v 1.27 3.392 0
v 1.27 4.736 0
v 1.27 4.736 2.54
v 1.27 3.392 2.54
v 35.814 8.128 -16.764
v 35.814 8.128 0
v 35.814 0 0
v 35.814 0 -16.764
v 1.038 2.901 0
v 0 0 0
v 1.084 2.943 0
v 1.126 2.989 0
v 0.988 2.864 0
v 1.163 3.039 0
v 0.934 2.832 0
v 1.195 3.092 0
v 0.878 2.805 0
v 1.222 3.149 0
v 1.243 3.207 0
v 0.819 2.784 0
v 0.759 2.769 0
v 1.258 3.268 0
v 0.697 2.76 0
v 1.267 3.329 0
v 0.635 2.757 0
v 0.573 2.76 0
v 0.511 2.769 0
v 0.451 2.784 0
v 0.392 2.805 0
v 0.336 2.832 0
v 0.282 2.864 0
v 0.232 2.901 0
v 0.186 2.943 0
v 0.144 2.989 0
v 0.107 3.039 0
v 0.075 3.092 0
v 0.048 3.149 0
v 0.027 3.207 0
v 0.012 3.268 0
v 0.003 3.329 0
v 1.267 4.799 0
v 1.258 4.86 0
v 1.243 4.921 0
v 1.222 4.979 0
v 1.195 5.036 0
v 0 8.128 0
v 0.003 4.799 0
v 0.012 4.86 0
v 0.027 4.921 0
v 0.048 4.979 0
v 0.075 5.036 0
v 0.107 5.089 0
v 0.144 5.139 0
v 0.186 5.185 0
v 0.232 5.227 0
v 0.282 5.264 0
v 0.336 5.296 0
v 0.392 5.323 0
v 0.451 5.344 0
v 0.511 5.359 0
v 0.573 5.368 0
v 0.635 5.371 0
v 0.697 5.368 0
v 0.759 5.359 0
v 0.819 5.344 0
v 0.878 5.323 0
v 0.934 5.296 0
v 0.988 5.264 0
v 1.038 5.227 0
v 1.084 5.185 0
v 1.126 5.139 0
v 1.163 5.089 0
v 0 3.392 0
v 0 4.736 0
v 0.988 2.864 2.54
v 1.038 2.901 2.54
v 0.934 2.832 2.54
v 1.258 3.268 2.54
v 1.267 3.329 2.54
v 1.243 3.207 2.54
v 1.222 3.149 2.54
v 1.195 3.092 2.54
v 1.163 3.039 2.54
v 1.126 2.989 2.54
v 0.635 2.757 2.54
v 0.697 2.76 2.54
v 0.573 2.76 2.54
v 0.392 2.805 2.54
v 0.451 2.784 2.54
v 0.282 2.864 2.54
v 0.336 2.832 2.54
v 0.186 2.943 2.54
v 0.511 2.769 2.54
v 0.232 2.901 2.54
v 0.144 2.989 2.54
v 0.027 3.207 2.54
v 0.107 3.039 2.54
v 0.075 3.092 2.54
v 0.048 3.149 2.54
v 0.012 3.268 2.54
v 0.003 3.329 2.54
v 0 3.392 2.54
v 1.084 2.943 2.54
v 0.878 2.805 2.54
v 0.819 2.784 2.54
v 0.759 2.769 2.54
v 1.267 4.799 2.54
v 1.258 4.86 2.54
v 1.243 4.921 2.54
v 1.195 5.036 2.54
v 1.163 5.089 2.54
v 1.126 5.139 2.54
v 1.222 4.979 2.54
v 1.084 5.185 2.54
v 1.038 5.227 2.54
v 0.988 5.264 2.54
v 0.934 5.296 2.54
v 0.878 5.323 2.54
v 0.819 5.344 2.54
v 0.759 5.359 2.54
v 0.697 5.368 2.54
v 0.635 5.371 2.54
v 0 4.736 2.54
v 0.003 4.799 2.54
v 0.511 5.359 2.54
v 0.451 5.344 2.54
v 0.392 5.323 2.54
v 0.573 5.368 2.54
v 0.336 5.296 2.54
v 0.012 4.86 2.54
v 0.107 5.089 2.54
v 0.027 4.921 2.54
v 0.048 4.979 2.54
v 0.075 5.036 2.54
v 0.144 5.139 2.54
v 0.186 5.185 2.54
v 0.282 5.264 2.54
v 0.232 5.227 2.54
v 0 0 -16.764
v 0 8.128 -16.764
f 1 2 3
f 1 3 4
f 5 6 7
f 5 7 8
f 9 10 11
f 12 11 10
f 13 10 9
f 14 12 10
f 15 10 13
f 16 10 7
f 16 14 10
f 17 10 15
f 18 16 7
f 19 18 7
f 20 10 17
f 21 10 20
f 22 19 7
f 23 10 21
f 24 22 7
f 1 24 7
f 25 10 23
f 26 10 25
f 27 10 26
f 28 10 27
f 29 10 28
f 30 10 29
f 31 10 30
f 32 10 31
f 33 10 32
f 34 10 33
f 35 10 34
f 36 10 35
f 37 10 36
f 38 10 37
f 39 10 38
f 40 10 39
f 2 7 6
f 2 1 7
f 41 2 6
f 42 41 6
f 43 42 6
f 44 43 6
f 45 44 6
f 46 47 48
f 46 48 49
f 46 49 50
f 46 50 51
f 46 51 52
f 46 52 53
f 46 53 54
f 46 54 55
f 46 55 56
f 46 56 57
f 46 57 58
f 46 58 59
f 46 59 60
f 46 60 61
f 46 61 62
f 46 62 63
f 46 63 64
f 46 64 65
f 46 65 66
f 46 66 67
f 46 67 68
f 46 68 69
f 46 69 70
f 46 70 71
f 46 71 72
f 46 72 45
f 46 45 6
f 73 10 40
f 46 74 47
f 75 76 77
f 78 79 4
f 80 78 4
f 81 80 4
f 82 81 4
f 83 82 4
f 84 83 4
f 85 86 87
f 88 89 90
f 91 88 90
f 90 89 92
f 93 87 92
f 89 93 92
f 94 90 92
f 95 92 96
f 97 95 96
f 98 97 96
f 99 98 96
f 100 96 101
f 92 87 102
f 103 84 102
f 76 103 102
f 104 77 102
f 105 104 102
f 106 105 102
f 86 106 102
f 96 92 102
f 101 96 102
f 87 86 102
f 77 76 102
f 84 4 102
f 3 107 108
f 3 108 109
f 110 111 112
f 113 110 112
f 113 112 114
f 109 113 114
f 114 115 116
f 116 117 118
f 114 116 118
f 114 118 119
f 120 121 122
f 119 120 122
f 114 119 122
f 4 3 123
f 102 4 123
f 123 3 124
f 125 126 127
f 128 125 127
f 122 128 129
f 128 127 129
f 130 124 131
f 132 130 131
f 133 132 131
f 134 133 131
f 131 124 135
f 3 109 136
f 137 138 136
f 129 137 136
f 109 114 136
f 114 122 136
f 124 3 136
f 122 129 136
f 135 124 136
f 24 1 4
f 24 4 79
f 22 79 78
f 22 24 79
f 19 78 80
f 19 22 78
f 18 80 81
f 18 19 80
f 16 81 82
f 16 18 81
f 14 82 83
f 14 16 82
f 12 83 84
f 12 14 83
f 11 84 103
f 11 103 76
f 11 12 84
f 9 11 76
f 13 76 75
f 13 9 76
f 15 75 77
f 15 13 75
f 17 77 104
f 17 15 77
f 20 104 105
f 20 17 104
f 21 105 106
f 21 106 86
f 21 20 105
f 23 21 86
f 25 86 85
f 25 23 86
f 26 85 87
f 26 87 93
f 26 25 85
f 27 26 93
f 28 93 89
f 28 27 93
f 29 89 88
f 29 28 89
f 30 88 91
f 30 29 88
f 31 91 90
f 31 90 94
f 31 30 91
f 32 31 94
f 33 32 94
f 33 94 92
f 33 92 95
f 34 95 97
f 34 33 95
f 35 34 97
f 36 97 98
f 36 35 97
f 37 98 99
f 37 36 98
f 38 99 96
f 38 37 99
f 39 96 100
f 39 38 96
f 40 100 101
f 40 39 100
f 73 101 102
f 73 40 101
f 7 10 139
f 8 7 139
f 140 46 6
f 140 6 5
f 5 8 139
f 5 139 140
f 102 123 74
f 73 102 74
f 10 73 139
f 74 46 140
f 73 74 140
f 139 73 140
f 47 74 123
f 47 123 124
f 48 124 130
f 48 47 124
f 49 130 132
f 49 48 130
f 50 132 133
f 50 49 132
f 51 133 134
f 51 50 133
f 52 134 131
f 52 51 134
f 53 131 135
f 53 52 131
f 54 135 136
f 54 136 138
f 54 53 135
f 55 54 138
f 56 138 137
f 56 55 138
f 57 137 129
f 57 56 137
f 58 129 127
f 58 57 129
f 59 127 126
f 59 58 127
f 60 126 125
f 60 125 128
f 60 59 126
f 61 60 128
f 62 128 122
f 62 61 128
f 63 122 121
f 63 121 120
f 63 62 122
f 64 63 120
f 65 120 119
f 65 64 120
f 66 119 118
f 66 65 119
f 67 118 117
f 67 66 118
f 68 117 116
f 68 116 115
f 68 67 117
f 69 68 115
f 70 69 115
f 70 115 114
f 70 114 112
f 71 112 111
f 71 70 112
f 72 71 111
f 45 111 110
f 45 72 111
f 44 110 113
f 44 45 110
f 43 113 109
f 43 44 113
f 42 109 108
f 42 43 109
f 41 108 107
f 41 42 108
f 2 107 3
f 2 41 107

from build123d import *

# Parameters (mm, degrees)
SKETCH1_W           = 16.764
SKETCH1_H           = 8.128
BOSS_EXTRUDE1_DEPTH = 35.814
BOSS_EXTRUDE2_DEPTH = 2.54


with BuildPart() as part:
    # Sketch1 → Boss-Extrude1 (new body)
    with BuildSketch(Plane(origin=(0, 0, 0), x_dir=(0, 0, -1), z_dir=(1, 0, 0))):
        with Locations((8.382, 4.064)):
            Rectangle(SKETCH1_W, SKETCH1_H)
    extrude(amount=BOSS_EXTRUDE1_DEPTH)

    # Sketch2 → Boss-Extrude2 (add)
    with BuildSketch(Plane.XY):
        with BuildLine():
            Line((1.27, 4.736473545), (1.27, 3.391526455))
            ThreePointArc((1.27, 3.391526455), (0.635, 2.756526455), (0, 3.391526455))
            Line((0, 3.391526455), (0, 4.736473545))
            ThreePointArc((0, 4.736473545), (0.635, 5.371473545), (1.27, 4.736473545))
        make_face()
    extrude(amount=BOSS_EXTRUDE2_DEPTH)


solid = part.part
